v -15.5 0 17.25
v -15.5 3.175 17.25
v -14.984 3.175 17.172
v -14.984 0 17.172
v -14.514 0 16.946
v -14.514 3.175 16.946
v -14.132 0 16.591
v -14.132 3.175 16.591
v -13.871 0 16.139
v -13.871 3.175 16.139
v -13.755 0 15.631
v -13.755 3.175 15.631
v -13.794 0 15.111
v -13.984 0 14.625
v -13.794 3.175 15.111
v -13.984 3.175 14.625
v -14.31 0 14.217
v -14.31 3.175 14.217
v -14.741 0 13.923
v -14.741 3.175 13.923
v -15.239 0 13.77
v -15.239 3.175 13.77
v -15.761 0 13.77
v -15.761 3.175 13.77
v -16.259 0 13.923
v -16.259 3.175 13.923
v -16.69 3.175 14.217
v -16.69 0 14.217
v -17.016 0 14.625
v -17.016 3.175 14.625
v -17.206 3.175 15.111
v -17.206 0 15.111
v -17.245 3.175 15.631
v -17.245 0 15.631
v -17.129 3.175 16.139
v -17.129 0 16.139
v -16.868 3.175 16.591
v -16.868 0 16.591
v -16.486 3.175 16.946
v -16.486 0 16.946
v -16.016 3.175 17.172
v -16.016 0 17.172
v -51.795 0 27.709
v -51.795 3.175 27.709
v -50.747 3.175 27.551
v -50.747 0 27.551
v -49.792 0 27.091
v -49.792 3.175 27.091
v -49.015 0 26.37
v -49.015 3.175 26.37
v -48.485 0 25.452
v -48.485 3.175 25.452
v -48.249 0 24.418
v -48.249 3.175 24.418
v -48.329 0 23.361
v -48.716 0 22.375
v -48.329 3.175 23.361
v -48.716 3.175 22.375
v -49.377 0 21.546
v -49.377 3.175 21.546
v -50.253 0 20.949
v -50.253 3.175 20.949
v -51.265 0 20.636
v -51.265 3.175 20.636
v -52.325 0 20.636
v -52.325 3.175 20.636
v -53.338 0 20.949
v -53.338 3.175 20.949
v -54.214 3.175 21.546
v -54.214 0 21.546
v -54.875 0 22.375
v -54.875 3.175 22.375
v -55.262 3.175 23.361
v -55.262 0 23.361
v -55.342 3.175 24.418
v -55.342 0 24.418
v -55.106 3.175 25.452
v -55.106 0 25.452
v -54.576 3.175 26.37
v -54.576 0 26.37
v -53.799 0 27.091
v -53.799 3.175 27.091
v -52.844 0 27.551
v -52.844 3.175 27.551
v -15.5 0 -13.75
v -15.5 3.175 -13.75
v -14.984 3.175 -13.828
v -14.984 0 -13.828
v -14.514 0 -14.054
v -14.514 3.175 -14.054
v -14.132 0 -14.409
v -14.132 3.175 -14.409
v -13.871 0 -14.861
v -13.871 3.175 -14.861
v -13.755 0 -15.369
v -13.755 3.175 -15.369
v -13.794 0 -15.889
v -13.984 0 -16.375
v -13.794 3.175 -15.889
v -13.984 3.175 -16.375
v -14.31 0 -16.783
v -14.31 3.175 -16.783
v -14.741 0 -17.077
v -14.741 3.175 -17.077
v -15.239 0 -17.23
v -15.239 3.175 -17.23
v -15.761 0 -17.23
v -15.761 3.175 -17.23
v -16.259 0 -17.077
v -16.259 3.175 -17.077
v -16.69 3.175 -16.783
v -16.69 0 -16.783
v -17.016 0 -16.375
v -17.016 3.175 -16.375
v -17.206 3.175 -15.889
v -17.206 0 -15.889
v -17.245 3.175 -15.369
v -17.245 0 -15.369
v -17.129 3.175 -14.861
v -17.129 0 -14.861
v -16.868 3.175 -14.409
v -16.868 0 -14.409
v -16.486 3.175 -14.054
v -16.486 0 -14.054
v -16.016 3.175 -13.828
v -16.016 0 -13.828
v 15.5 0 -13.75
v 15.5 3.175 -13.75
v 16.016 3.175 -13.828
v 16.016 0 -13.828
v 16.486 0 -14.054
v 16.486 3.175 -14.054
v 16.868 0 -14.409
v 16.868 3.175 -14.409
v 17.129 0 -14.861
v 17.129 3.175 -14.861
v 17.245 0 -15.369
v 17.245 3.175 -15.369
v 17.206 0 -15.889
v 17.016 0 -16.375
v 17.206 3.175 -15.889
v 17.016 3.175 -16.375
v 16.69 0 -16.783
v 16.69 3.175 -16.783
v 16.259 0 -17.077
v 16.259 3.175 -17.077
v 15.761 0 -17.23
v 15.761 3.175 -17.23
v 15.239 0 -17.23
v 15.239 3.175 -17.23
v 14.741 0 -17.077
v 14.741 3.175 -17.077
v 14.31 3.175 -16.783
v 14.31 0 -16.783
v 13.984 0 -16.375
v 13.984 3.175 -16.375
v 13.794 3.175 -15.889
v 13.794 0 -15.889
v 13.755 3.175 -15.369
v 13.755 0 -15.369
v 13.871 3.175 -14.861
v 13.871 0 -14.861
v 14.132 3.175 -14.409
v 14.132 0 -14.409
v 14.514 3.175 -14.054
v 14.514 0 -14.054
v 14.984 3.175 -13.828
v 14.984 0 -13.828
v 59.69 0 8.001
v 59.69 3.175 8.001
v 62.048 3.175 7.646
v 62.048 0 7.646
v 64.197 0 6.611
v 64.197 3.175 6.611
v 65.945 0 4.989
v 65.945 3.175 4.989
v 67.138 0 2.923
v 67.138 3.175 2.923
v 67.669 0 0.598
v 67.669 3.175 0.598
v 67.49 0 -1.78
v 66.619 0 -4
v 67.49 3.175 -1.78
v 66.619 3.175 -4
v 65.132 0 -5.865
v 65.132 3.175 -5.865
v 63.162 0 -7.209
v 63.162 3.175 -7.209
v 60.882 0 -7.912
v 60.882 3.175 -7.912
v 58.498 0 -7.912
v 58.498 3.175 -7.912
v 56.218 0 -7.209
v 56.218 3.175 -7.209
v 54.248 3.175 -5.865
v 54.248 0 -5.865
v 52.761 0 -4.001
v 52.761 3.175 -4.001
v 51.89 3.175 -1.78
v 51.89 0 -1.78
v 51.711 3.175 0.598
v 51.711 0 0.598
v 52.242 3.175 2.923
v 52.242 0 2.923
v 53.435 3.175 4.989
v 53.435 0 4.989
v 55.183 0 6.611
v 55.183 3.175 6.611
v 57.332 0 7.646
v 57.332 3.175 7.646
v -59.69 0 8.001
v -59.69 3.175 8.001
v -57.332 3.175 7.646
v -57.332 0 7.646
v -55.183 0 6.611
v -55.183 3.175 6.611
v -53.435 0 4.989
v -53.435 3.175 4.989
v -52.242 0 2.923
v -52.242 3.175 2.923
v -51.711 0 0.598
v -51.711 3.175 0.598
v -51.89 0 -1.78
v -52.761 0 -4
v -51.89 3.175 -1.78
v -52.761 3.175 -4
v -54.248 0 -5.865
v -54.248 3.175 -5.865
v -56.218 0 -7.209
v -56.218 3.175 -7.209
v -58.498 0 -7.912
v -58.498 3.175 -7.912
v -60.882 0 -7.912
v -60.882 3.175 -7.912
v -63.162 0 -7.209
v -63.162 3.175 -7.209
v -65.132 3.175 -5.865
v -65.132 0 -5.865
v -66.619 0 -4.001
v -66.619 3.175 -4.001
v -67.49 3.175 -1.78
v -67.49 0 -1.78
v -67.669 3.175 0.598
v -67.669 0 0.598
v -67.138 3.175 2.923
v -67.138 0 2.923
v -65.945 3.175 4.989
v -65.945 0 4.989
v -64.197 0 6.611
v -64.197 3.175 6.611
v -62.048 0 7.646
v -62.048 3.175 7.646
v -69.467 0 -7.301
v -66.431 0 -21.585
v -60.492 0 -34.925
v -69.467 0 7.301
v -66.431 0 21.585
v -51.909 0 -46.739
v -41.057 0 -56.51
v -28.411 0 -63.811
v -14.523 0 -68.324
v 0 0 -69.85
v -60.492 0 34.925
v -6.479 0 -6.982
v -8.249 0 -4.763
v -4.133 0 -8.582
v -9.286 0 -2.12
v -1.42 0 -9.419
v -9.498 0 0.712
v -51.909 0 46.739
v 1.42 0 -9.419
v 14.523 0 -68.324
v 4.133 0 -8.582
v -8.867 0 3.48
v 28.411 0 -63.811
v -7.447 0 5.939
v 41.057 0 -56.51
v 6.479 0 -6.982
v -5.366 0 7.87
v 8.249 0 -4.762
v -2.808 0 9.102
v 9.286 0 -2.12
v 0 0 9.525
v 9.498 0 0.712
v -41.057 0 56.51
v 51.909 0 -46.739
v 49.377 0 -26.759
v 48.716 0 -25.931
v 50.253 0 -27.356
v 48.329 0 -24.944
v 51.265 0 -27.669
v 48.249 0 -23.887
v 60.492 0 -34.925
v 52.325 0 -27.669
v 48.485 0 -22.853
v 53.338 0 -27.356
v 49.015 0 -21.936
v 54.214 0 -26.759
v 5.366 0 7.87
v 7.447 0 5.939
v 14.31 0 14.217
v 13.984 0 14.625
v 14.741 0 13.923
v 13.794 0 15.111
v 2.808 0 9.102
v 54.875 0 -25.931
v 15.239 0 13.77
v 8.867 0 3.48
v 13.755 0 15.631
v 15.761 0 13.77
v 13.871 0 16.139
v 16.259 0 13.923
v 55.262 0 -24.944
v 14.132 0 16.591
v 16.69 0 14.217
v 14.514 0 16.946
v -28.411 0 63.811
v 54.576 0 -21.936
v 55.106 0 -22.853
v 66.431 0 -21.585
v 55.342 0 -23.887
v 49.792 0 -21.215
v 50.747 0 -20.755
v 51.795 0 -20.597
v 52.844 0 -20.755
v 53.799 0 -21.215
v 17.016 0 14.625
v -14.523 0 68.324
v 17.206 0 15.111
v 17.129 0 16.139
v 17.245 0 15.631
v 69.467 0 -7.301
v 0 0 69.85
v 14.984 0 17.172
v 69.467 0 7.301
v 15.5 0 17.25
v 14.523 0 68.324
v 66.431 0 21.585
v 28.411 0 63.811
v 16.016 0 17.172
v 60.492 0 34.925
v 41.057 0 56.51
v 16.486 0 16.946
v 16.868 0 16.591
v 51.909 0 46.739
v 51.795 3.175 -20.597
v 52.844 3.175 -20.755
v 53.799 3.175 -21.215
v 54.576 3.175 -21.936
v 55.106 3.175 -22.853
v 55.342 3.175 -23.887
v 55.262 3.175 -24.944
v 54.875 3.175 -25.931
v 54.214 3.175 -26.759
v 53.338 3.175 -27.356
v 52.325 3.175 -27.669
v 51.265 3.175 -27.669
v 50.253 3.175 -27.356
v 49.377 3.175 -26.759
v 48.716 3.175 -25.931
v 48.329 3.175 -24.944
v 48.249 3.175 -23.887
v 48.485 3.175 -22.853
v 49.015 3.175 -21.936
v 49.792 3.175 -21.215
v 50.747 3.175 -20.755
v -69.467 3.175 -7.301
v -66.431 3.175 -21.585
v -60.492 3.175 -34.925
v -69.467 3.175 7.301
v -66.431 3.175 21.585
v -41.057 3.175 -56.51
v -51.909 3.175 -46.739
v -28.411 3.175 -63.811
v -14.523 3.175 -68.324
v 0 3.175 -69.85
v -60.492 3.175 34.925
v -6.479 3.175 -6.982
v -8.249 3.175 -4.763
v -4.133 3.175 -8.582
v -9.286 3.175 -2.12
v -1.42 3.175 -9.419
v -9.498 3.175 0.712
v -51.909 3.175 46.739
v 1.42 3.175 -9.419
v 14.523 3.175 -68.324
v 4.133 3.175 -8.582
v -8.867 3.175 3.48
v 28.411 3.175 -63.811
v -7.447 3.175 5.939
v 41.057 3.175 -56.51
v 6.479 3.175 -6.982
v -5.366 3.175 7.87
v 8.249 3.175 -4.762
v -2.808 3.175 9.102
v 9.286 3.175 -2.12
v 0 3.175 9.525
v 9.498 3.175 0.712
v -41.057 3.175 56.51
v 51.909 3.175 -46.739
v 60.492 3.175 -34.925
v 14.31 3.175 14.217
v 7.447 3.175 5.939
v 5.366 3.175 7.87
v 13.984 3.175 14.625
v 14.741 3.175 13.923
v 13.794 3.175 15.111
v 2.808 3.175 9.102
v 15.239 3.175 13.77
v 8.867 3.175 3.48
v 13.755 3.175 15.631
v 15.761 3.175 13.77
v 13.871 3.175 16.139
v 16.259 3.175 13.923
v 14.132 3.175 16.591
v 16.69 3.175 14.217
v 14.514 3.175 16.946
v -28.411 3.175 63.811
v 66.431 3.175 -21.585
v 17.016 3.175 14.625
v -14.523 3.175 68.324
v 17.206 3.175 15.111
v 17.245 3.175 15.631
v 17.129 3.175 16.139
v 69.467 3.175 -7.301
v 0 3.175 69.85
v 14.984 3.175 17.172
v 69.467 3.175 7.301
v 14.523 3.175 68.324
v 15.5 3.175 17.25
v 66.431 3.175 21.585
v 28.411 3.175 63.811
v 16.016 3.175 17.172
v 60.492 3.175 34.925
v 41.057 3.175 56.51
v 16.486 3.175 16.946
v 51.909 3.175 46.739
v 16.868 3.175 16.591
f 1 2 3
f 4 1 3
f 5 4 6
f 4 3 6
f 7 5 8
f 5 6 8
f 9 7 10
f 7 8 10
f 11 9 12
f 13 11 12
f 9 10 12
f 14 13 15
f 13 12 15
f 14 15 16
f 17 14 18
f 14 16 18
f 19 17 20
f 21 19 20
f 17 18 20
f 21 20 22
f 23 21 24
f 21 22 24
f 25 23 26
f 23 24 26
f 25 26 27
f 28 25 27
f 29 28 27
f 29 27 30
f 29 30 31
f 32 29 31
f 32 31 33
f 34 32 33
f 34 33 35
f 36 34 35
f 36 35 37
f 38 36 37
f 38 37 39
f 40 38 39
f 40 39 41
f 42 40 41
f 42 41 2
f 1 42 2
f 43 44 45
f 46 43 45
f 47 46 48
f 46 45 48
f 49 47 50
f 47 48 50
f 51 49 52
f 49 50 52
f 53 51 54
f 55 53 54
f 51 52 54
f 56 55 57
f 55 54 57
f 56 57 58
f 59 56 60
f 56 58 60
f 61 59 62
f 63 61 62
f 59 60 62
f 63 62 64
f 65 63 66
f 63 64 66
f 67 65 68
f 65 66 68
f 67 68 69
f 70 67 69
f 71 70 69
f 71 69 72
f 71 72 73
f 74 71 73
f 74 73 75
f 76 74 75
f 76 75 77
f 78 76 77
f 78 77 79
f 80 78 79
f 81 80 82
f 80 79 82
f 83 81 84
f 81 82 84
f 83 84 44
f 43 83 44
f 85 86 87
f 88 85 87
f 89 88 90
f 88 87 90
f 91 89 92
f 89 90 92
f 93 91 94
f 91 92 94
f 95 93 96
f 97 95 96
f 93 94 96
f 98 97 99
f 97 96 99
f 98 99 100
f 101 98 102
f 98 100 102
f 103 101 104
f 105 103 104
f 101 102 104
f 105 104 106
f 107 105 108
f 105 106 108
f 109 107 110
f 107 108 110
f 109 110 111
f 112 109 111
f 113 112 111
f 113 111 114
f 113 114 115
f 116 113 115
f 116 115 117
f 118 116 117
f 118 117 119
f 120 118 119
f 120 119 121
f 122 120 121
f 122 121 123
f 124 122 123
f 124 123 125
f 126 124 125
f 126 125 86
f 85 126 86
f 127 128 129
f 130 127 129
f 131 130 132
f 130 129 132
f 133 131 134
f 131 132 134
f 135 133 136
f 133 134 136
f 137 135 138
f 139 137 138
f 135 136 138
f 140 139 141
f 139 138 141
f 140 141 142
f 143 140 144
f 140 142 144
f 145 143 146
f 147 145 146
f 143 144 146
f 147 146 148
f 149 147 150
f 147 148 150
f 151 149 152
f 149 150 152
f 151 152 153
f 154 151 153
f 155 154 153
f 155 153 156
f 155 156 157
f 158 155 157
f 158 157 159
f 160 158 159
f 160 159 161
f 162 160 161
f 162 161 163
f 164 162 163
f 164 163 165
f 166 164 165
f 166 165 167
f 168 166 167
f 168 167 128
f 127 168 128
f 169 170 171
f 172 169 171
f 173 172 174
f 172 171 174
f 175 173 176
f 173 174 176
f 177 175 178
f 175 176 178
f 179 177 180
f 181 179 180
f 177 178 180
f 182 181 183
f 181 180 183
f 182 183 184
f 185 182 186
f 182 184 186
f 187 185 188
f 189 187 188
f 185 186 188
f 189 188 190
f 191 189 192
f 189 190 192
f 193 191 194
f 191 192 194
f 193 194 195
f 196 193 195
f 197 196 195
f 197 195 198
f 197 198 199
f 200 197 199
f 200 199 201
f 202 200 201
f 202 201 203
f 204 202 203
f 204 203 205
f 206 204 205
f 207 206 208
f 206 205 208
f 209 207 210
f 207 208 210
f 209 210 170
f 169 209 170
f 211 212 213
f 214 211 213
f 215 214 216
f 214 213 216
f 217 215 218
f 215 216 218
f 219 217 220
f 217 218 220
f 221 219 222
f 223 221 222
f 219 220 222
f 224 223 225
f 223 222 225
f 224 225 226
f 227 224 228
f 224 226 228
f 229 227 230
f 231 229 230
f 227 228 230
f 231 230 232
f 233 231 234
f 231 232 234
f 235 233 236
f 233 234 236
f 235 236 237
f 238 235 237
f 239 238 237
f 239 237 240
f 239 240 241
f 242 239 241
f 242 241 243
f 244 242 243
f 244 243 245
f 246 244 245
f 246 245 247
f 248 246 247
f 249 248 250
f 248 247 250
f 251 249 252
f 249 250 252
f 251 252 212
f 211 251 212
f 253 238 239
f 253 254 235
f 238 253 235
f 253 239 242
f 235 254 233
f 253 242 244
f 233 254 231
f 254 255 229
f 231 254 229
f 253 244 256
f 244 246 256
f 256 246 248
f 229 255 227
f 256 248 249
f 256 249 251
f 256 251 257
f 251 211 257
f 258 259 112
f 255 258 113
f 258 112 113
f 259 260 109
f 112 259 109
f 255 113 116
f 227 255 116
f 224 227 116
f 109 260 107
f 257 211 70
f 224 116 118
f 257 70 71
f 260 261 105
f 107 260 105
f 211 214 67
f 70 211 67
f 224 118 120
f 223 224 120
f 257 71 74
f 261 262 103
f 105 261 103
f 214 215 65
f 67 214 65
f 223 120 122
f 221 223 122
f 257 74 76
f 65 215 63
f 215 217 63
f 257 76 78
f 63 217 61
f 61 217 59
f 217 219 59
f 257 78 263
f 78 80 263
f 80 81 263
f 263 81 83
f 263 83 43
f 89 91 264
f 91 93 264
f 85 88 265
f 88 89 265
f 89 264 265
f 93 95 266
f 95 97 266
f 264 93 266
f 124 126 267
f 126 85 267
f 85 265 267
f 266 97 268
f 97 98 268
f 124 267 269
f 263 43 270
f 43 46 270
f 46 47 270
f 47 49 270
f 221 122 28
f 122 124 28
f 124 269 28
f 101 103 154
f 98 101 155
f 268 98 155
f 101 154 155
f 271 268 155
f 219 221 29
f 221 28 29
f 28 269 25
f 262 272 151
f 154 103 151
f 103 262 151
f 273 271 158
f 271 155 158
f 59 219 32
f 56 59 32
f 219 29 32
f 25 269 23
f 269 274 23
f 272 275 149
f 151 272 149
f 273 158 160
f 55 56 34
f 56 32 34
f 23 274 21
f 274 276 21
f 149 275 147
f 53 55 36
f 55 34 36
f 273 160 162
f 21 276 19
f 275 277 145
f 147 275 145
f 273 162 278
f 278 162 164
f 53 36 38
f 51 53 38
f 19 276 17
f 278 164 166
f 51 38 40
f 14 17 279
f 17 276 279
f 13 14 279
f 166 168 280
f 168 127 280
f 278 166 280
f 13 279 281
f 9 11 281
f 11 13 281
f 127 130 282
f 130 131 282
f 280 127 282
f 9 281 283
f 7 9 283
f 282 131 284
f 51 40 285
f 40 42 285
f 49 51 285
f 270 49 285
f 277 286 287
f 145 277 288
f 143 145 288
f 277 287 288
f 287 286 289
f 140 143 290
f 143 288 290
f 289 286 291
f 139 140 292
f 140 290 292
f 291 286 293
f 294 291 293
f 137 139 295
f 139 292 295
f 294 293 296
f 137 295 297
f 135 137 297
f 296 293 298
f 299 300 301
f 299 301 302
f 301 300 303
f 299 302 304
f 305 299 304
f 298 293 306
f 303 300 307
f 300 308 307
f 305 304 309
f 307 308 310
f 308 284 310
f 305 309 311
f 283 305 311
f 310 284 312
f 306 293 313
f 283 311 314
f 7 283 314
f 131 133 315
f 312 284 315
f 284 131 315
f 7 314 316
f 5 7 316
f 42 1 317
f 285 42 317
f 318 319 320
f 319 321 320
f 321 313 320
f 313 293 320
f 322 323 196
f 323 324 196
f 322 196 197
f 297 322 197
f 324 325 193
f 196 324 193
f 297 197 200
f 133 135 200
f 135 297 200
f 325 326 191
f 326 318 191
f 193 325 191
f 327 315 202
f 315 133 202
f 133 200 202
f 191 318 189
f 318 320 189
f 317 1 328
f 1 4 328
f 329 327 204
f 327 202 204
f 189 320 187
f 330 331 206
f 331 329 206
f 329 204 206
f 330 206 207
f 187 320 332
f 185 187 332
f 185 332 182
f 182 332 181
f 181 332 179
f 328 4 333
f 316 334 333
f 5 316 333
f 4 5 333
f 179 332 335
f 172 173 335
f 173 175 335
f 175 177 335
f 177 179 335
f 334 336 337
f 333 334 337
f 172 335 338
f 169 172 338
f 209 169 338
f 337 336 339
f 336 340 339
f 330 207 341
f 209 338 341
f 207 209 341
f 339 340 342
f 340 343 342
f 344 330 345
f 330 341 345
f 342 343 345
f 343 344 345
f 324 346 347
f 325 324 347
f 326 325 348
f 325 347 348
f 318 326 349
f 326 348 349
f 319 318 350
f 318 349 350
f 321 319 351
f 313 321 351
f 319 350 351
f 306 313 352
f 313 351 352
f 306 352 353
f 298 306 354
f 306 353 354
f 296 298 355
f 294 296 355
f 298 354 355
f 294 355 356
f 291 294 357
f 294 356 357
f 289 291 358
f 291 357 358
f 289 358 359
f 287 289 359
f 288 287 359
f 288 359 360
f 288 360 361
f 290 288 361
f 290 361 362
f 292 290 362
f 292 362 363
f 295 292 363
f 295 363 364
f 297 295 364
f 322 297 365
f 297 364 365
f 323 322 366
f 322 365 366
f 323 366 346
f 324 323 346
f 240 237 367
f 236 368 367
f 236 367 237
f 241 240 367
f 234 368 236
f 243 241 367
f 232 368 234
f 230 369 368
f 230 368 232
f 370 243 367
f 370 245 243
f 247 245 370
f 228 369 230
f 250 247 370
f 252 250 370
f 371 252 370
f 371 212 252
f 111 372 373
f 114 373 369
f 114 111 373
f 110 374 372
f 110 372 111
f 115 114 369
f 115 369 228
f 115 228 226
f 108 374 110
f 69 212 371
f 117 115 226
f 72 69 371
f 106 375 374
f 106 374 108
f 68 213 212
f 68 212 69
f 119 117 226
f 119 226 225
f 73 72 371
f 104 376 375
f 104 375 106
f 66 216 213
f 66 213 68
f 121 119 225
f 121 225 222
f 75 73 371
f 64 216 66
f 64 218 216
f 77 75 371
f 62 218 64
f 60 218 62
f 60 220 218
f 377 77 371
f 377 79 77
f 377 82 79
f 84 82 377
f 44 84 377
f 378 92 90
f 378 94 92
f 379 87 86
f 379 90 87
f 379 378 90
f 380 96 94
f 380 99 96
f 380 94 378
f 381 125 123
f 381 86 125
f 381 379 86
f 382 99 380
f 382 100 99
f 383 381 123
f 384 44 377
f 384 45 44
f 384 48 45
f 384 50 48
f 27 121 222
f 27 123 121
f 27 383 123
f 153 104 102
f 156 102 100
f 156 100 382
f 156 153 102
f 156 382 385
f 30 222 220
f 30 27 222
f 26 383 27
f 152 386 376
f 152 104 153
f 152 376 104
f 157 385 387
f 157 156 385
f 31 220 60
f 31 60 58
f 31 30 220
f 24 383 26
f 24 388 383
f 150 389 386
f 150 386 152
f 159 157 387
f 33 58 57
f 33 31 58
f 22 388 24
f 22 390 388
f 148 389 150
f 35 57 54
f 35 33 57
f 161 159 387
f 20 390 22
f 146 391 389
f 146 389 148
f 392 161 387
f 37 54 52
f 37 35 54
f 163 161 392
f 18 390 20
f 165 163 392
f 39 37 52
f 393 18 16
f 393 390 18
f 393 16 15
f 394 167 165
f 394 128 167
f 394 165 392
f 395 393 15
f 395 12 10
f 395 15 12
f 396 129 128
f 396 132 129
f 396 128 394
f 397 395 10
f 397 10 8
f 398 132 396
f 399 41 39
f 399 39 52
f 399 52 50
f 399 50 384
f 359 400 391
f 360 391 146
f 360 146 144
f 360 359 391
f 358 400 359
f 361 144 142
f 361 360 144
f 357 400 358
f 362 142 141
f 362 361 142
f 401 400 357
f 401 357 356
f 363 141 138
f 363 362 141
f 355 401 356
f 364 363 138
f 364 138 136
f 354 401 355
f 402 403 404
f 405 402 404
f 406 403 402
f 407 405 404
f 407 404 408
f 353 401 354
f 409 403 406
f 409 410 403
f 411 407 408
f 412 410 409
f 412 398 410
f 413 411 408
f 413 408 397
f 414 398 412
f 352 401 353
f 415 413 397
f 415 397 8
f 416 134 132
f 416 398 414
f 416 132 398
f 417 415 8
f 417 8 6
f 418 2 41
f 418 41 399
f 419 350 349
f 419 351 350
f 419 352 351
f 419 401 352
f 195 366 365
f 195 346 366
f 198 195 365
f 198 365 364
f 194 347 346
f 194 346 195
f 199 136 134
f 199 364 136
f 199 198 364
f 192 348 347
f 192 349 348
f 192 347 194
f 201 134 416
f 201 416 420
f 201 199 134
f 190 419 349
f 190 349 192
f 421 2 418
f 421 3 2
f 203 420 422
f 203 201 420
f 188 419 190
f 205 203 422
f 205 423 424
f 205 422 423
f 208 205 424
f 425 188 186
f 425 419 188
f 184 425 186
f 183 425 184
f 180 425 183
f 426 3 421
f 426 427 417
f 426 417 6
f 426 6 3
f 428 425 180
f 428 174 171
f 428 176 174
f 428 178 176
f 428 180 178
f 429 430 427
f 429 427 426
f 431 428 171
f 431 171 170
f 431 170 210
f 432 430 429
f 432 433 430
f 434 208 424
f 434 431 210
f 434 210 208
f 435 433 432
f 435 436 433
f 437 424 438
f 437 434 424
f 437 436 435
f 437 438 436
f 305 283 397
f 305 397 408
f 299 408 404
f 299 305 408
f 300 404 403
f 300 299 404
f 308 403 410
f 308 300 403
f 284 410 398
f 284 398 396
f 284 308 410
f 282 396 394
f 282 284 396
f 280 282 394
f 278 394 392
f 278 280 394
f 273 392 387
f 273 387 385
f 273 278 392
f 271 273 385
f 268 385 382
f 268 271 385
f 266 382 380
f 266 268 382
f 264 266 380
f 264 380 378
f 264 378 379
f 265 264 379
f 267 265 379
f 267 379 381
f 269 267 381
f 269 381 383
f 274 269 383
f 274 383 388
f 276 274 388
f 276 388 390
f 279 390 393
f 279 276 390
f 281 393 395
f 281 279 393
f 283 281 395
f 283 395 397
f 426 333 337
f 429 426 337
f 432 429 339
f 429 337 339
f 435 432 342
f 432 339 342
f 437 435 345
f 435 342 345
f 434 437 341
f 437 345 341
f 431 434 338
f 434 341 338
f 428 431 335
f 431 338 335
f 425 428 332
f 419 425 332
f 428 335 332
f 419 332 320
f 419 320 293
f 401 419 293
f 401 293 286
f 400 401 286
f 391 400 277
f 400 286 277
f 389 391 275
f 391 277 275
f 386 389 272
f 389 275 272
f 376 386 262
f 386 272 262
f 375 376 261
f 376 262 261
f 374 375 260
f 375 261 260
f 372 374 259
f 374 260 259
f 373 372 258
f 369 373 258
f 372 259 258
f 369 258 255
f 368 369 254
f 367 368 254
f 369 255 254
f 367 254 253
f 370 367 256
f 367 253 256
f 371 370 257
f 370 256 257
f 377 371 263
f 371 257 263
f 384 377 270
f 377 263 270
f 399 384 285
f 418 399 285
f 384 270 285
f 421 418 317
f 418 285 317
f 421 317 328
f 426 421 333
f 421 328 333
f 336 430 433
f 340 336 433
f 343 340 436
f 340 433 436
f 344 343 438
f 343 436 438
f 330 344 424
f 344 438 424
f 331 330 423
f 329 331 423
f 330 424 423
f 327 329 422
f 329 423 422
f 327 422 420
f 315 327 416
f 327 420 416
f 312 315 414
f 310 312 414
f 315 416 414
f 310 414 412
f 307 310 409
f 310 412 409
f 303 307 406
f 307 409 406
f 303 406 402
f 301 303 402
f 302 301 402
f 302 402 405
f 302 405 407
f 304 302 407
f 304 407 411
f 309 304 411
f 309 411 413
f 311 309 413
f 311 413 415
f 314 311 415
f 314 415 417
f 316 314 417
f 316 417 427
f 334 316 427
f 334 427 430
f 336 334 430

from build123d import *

# Parameters (mm, degrees)
SKETCH1_R           = 69.85
SKETCH1_R_2         = 9.525
BOSS_EXTRUDE1_DEPTH = 3.175
SKETCH2_R           = 8.001
SKETCH2_R_2         = 3.556
CUT_EXTRUDE1_DEPTH  = 3.175
SKETCH3_R           = 1.750000056
SKETCH3_R_2         = 1.75
CUT_EXTRUDE2_DEPTH  = 50.8


with BuildPart() as part:
    # Sketch1 → Boss-Extrude1 (new body)
    with BuildSketch(Plane(origin=(0, 0, 0), x_dir=(1, 0, 0), z_dir=(0, 1, 0))):
        with Locations(Location((0, 0, 0), (0, 0, 270))):
            Circle(SKETCH1_R)
        with Locations(Location((0, 0, 0), (0, 0, 270))):
            Circle(SKETCH1_R_2, mode=Mode.SUBTRACT)
    extrude(amount=BOSS_EXTRUDE1_DEPTH)

    # Sketch2 → Cut-Extrude1 (cut)
    with BuildSketch(Plane(origin=(0, 3.175, 0), x_dir=(1, 0, 0), z_dir=(0, 1, 0))):
        with Locations(Location((-59.69, 0, 0), (0, 0, 270))):
            Circle(SKETCH2_R)
        with Locations(Location((59.69, 0, 0), (0, 0, 270))):
            Circle(SKETCH2_R)
        with Locations(Location((-51.795490029, -24.152633658, 0), (0, 0, 270))):
            Circle(SKETCH2_R_2)
        with Locations(Location((51.795490029, 24.152633658, 0), (0, 0, 270))):
            Circle(SKETCH2_R_2)
    extrude(amount=-CUT_EXTRUDE1_DEPTH, mode=Mode.SUBTRACT)

    # Sketch3 → Cut-Extrude2 (cut)
    with BuildSketch(Plane(origin=(0, 3.175, 0), x_dir=(1, 0, 0), z_dir=(0, 1, 0))):
        with Locations(Location((15.5, 15.5, 0), (0, 0, 270))):
            Circle(SKETCH3_R)
        with Locations(Location((15.5, -15.5, 0), (0, 0, 270))):
            Circle(SKETCH3_R)
        with Locations(Location((-15.5, -15.5, 0), (0, 0, 270))):
            Circle(SKETCH3_R)
        with Locations(Location((-15.5, 15.5, 0), (0, 0, 270))):
            Circle(SKETCH3_R_2)
    extrude(amount=-CUT_EXTRUDE2_DEPTH, mode=Mode.SUBTRACT)


solid = part.part
